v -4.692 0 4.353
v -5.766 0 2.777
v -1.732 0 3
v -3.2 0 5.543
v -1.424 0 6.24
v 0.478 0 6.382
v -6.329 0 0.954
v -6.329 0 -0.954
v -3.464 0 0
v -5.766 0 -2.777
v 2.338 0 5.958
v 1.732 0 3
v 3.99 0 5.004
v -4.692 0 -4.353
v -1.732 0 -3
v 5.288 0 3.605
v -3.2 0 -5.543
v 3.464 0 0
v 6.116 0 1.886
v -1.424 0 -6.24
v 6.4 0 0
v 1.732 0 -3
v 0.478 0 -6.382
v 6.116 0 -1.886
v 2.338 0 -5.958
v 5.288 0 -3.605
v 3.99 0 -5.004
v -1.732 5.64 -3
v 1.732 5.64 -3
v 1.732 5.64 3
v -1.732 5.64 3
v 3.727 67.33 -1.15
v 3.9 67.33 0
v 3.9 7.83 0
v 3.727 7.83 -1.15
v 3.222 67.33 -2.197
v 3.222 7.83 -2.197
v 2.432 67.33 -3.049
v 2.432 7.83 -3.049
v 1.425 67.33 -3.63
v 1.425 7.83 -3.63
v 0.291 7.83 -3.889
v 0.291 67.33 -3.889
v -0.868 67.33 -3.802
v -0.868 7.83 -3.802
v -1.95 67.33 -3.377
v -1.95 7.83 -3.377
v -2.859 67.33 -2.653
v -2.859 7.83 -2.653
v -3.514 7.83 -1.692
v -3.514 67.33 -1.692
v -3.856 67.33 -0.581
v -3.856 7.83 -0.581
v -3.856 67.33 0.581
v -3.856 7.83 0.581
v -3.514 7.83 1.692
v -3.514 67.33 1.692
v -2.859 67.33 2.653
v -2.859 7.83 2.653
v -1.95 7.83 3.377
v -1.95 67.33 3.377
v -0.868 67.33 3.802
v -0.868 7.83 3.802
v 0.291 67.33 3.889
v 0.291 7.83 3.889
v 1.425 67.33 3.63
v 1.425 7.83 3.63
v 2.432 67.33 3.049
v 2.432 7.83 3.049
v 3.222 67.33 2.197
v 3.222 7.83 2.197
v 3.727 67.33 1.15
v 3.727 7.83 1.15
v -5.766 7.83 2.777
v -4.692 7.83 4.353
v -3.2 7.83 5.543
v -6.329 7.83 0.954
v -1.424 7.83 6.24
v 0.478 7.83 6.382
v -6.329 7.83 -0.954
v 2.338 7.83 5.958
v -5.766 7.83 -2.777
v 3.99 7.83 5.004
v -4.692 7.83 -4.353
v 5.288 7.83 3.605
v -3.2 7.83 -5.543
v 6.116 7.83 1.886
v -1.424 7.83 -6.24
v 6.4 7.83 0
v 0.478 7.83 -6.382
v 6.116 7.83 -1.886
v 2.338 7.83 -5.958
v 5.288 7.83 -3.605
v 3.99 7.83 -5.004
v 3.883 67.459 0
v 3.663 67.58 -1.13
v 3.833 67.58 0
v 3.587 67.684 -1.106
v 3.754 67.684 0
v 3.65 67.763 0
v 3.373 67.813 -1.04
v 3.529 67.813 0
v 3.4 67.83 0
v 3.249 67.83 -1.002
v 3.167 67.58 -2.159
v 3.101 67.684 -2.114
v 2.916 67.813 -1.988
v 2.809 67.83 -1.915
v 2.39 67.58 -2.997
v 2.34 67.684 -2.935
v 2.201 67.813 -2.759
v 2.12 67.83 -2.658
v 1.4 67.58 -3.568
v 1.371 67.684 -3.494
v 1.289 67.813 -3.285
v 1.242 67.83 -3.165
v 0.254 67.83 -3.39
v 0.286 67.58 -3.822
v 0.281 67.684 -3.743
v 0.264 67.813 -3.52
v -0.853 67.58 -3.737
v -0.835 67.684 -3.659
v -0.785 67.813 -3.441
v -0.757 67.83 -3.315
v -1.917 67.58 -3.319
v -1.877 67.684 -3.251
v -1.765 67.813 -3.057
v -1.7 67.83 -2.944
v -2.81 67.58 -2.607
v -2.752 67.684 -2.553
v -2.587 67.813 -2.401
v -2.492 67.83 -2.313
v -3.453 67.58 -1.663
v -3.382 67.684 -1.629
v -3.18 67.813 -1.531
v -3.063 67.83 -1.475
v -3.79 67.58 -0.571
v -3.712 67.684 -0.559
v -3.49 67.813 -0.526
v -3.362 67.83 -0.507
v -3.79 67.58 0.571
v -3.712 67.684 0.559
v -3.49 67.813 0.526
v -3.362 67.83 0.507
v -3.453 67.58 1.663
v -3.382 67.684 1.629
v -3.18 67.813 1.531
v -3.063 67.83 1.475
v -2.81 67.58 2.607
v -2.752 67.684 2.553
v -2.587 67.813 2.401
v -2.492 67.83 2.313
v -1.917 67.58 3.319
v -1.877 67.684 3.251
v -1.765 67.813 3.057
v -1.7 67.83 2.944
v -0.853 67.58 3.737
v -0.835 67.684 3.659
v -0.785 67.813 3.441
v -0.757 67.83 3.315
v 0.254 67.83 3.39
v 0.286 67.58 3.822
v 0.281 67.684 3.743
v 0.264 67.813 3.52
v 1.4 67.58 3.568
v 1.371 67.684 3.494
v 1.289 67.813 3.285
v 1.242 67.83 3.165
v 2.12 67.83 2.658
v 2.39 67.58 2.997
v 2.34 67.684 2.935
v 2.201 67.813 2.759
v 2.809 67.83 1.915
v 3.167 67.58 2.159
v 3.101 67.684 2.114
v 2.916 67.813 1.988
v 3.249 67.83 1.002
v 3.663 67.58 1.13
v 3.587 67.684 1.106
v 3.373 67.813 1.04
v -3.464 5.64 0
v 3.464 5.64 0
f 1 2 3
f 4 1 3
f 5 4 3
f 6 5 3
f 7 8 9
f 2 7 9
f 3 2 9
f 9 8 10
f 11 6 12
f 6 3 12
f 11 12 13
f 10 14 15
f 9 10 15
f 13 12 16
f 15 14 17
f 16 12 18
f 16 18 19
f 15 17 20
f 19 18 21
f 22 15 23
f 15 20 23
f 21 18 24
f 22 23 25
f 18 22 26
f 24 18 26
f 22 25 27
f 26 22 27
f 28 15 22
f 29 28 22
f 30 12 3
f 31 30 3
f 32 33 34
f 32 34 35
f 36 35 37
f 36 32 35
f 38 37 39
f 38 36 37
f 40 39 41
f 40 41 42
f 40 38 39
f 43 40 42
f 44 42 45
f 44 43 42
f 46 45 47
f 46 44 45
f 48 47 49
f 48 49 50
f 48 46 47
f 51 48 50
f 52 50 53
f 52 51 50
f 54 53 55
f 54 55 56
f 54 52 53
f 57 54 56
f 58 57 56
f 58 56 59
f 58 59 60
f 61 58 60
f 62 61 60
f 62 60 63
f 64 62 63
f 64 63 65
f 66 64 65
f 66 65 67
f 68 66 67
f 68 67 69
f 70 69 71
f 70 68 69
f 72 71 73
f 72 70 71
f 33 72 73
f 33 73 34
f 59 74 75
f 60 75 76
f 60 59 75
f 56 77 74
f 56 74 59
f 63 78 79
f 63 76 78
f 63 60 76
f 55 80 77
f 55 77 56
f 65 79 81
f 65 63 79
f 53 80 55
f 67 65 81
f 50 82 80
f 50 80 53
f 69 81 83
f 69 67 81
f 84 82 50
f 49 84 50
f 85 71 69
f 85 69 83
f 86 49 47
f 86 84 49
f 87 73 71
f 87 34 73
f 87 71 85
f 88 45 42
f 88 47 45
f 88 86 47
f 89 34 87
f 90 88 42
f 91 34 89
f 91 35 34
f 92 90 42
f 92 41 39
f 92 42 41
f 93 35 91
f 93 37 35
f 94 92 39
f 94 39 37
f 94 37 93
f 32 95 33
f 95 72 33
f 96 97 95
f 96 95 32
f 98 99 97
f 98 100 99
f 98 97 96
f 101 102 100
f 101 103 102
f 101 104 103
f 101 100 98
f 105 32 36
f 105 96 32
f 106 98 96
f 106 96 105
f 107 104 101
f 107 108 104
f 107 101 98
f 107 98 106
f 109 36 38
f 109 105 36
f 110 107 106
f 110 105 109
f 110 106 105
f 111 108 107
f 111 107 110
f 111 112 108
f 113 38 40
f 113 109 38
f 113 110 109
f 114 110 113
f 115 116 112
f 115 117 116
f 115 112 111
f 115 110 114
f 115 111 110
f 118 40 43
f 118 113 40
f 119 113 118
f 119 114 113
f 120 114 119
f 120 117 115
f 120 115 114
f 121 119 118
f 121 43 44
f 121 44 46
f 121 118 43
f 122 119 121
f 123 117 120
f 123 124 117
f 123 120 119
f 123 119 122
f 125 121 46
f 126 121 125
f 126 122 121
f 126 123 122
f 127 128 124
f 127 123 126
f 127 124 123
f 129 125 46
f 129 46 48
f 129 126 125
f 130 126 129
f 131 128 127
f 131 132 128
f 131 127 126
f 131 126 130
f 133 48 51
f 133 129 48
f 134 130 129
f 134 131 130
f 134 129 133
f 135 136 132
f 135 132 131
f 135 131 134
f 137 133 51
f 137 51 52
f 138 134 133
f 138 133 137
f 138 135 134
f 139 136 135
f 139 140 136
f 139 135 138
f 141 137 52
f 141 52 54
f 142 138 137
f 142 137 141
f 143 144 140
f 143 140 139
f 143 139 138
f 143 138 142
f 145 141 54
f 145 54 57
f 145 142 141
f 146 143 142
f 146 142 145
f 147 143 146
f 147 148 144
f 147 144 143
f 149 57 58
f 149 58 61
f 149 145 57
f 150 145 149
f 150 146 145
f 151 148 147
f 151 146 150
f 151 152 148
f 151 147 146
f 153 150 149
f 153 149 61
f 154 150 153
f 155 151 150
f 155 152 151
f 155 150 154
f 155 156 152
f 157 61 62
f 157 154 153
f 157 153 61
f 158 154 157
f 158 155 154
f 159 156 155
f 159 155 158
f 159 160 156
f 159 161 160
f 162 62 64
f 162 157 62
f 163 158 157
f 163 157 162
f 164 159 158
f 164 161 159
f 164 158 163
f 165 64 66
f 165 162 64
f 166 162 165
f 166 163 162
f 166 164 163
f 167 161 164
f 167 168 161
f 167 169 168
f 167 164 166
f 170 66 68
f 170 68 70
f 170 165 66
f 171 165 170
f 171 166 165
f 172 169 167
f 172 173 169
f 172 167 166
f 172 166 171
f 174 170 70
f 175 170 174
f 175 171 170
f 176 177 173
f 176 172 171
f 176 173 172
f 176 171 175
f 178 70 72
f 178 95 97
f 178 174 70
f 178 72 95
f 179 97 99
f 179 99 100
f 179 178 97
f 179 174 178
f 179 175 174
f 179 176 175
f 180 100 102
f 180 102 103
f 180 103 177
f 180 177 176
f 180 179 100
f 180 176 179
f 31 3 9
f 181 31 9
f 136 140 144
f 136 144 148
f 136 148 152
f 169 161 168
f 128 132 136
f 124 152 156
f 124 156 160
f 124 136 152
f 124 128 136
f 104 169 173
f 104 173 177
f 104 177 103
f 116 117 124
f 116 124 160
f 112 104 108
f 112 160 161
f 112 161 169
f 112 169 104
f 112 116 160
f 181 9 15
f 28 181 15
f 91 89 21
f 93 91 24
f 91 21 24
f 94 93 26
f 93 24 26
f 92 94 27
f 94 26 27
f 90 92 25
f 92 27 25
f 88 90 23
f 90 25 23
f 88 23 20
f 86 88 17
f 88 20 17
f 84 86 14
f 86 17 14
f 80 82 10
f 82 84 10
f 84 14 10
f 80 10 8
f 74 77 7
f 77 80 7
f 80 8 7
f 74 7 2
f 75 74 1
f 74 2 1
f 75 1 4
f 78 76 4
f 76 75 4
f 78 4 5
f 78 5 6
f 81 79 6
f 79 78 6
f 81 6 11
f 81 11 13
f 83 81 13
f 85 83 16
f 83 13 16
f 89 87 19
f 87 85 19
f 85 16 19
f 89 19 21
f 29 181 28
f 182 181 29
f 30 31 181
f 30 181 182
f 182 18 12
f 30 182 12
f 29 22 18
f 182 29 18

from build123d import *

# Parameters (mm, degrees)
SKETCH1_R           = 6.4
BOSS_EXTRUDE1_DEPTH = 67.83
SKETCH2_OUTSIDE_W   = 28.84
SKETCH2_OUTSIDE_H   = 28.84
SKETCH2_OUTSIDE_R   = 3.9
CUT_EXTRUDE1_DEPTH  = 60
CUT_EXTRUDE2_DEPTH  = 5.64
FILLET1_R           = 0.5


with BuildPart() as part:
    # Sketch1 → Boss-Extrude1 (new body)
    with BuildSketch(Plane(origin=(0, 0, 0), x_dir=(1, 0, 0), z_dir=(0, 1, 0))):
        Circle(SKETCH1_R)
    extrude(amount=BOSS_EXTRUDE1_DEPTH)

    # Sketch2 outside → Cut-Extrude1 (cut)
    with BuildSketch(Plane(origin=(0, 67.83, 0), x_dir=(1, 0, 0), z_dir=(0, 1, 0))):
        Rectangle(SKETCH2_OUTSIDE_W, SKETCH2_OUTSIDE_H)
        Circle(SKETCH2_OUTSIDE_R, mode=Mode.SUBTRACT)
    extrude(amount=-CUT_EXTRUDE1_DEPTH, mode=Mode.SUBTRACT)

    # Sketch8 → Cut-Extrude2 (cut)
    with BuildSketch(Plane.XZ):
        Polygon((3.464101615, 0), (1.732050808, 3), (-1.732050808, 3), (-3.464101615, 0), (-1.732050808, -3), (1.732050808, -3), align=None)
    extrude(amount=-CUT_EXTRUDE2_DEPTH, mode=Mode.SUBTRACT)

    # Fillet1
    fillet1_edges = [part.edges().sort_by_distance(p)[0] for p in [
        (-3.9, 67.83, 0),
    ]]
    fillet(fillet1_edges, radius=FILLET1_R)


solid = part.part
